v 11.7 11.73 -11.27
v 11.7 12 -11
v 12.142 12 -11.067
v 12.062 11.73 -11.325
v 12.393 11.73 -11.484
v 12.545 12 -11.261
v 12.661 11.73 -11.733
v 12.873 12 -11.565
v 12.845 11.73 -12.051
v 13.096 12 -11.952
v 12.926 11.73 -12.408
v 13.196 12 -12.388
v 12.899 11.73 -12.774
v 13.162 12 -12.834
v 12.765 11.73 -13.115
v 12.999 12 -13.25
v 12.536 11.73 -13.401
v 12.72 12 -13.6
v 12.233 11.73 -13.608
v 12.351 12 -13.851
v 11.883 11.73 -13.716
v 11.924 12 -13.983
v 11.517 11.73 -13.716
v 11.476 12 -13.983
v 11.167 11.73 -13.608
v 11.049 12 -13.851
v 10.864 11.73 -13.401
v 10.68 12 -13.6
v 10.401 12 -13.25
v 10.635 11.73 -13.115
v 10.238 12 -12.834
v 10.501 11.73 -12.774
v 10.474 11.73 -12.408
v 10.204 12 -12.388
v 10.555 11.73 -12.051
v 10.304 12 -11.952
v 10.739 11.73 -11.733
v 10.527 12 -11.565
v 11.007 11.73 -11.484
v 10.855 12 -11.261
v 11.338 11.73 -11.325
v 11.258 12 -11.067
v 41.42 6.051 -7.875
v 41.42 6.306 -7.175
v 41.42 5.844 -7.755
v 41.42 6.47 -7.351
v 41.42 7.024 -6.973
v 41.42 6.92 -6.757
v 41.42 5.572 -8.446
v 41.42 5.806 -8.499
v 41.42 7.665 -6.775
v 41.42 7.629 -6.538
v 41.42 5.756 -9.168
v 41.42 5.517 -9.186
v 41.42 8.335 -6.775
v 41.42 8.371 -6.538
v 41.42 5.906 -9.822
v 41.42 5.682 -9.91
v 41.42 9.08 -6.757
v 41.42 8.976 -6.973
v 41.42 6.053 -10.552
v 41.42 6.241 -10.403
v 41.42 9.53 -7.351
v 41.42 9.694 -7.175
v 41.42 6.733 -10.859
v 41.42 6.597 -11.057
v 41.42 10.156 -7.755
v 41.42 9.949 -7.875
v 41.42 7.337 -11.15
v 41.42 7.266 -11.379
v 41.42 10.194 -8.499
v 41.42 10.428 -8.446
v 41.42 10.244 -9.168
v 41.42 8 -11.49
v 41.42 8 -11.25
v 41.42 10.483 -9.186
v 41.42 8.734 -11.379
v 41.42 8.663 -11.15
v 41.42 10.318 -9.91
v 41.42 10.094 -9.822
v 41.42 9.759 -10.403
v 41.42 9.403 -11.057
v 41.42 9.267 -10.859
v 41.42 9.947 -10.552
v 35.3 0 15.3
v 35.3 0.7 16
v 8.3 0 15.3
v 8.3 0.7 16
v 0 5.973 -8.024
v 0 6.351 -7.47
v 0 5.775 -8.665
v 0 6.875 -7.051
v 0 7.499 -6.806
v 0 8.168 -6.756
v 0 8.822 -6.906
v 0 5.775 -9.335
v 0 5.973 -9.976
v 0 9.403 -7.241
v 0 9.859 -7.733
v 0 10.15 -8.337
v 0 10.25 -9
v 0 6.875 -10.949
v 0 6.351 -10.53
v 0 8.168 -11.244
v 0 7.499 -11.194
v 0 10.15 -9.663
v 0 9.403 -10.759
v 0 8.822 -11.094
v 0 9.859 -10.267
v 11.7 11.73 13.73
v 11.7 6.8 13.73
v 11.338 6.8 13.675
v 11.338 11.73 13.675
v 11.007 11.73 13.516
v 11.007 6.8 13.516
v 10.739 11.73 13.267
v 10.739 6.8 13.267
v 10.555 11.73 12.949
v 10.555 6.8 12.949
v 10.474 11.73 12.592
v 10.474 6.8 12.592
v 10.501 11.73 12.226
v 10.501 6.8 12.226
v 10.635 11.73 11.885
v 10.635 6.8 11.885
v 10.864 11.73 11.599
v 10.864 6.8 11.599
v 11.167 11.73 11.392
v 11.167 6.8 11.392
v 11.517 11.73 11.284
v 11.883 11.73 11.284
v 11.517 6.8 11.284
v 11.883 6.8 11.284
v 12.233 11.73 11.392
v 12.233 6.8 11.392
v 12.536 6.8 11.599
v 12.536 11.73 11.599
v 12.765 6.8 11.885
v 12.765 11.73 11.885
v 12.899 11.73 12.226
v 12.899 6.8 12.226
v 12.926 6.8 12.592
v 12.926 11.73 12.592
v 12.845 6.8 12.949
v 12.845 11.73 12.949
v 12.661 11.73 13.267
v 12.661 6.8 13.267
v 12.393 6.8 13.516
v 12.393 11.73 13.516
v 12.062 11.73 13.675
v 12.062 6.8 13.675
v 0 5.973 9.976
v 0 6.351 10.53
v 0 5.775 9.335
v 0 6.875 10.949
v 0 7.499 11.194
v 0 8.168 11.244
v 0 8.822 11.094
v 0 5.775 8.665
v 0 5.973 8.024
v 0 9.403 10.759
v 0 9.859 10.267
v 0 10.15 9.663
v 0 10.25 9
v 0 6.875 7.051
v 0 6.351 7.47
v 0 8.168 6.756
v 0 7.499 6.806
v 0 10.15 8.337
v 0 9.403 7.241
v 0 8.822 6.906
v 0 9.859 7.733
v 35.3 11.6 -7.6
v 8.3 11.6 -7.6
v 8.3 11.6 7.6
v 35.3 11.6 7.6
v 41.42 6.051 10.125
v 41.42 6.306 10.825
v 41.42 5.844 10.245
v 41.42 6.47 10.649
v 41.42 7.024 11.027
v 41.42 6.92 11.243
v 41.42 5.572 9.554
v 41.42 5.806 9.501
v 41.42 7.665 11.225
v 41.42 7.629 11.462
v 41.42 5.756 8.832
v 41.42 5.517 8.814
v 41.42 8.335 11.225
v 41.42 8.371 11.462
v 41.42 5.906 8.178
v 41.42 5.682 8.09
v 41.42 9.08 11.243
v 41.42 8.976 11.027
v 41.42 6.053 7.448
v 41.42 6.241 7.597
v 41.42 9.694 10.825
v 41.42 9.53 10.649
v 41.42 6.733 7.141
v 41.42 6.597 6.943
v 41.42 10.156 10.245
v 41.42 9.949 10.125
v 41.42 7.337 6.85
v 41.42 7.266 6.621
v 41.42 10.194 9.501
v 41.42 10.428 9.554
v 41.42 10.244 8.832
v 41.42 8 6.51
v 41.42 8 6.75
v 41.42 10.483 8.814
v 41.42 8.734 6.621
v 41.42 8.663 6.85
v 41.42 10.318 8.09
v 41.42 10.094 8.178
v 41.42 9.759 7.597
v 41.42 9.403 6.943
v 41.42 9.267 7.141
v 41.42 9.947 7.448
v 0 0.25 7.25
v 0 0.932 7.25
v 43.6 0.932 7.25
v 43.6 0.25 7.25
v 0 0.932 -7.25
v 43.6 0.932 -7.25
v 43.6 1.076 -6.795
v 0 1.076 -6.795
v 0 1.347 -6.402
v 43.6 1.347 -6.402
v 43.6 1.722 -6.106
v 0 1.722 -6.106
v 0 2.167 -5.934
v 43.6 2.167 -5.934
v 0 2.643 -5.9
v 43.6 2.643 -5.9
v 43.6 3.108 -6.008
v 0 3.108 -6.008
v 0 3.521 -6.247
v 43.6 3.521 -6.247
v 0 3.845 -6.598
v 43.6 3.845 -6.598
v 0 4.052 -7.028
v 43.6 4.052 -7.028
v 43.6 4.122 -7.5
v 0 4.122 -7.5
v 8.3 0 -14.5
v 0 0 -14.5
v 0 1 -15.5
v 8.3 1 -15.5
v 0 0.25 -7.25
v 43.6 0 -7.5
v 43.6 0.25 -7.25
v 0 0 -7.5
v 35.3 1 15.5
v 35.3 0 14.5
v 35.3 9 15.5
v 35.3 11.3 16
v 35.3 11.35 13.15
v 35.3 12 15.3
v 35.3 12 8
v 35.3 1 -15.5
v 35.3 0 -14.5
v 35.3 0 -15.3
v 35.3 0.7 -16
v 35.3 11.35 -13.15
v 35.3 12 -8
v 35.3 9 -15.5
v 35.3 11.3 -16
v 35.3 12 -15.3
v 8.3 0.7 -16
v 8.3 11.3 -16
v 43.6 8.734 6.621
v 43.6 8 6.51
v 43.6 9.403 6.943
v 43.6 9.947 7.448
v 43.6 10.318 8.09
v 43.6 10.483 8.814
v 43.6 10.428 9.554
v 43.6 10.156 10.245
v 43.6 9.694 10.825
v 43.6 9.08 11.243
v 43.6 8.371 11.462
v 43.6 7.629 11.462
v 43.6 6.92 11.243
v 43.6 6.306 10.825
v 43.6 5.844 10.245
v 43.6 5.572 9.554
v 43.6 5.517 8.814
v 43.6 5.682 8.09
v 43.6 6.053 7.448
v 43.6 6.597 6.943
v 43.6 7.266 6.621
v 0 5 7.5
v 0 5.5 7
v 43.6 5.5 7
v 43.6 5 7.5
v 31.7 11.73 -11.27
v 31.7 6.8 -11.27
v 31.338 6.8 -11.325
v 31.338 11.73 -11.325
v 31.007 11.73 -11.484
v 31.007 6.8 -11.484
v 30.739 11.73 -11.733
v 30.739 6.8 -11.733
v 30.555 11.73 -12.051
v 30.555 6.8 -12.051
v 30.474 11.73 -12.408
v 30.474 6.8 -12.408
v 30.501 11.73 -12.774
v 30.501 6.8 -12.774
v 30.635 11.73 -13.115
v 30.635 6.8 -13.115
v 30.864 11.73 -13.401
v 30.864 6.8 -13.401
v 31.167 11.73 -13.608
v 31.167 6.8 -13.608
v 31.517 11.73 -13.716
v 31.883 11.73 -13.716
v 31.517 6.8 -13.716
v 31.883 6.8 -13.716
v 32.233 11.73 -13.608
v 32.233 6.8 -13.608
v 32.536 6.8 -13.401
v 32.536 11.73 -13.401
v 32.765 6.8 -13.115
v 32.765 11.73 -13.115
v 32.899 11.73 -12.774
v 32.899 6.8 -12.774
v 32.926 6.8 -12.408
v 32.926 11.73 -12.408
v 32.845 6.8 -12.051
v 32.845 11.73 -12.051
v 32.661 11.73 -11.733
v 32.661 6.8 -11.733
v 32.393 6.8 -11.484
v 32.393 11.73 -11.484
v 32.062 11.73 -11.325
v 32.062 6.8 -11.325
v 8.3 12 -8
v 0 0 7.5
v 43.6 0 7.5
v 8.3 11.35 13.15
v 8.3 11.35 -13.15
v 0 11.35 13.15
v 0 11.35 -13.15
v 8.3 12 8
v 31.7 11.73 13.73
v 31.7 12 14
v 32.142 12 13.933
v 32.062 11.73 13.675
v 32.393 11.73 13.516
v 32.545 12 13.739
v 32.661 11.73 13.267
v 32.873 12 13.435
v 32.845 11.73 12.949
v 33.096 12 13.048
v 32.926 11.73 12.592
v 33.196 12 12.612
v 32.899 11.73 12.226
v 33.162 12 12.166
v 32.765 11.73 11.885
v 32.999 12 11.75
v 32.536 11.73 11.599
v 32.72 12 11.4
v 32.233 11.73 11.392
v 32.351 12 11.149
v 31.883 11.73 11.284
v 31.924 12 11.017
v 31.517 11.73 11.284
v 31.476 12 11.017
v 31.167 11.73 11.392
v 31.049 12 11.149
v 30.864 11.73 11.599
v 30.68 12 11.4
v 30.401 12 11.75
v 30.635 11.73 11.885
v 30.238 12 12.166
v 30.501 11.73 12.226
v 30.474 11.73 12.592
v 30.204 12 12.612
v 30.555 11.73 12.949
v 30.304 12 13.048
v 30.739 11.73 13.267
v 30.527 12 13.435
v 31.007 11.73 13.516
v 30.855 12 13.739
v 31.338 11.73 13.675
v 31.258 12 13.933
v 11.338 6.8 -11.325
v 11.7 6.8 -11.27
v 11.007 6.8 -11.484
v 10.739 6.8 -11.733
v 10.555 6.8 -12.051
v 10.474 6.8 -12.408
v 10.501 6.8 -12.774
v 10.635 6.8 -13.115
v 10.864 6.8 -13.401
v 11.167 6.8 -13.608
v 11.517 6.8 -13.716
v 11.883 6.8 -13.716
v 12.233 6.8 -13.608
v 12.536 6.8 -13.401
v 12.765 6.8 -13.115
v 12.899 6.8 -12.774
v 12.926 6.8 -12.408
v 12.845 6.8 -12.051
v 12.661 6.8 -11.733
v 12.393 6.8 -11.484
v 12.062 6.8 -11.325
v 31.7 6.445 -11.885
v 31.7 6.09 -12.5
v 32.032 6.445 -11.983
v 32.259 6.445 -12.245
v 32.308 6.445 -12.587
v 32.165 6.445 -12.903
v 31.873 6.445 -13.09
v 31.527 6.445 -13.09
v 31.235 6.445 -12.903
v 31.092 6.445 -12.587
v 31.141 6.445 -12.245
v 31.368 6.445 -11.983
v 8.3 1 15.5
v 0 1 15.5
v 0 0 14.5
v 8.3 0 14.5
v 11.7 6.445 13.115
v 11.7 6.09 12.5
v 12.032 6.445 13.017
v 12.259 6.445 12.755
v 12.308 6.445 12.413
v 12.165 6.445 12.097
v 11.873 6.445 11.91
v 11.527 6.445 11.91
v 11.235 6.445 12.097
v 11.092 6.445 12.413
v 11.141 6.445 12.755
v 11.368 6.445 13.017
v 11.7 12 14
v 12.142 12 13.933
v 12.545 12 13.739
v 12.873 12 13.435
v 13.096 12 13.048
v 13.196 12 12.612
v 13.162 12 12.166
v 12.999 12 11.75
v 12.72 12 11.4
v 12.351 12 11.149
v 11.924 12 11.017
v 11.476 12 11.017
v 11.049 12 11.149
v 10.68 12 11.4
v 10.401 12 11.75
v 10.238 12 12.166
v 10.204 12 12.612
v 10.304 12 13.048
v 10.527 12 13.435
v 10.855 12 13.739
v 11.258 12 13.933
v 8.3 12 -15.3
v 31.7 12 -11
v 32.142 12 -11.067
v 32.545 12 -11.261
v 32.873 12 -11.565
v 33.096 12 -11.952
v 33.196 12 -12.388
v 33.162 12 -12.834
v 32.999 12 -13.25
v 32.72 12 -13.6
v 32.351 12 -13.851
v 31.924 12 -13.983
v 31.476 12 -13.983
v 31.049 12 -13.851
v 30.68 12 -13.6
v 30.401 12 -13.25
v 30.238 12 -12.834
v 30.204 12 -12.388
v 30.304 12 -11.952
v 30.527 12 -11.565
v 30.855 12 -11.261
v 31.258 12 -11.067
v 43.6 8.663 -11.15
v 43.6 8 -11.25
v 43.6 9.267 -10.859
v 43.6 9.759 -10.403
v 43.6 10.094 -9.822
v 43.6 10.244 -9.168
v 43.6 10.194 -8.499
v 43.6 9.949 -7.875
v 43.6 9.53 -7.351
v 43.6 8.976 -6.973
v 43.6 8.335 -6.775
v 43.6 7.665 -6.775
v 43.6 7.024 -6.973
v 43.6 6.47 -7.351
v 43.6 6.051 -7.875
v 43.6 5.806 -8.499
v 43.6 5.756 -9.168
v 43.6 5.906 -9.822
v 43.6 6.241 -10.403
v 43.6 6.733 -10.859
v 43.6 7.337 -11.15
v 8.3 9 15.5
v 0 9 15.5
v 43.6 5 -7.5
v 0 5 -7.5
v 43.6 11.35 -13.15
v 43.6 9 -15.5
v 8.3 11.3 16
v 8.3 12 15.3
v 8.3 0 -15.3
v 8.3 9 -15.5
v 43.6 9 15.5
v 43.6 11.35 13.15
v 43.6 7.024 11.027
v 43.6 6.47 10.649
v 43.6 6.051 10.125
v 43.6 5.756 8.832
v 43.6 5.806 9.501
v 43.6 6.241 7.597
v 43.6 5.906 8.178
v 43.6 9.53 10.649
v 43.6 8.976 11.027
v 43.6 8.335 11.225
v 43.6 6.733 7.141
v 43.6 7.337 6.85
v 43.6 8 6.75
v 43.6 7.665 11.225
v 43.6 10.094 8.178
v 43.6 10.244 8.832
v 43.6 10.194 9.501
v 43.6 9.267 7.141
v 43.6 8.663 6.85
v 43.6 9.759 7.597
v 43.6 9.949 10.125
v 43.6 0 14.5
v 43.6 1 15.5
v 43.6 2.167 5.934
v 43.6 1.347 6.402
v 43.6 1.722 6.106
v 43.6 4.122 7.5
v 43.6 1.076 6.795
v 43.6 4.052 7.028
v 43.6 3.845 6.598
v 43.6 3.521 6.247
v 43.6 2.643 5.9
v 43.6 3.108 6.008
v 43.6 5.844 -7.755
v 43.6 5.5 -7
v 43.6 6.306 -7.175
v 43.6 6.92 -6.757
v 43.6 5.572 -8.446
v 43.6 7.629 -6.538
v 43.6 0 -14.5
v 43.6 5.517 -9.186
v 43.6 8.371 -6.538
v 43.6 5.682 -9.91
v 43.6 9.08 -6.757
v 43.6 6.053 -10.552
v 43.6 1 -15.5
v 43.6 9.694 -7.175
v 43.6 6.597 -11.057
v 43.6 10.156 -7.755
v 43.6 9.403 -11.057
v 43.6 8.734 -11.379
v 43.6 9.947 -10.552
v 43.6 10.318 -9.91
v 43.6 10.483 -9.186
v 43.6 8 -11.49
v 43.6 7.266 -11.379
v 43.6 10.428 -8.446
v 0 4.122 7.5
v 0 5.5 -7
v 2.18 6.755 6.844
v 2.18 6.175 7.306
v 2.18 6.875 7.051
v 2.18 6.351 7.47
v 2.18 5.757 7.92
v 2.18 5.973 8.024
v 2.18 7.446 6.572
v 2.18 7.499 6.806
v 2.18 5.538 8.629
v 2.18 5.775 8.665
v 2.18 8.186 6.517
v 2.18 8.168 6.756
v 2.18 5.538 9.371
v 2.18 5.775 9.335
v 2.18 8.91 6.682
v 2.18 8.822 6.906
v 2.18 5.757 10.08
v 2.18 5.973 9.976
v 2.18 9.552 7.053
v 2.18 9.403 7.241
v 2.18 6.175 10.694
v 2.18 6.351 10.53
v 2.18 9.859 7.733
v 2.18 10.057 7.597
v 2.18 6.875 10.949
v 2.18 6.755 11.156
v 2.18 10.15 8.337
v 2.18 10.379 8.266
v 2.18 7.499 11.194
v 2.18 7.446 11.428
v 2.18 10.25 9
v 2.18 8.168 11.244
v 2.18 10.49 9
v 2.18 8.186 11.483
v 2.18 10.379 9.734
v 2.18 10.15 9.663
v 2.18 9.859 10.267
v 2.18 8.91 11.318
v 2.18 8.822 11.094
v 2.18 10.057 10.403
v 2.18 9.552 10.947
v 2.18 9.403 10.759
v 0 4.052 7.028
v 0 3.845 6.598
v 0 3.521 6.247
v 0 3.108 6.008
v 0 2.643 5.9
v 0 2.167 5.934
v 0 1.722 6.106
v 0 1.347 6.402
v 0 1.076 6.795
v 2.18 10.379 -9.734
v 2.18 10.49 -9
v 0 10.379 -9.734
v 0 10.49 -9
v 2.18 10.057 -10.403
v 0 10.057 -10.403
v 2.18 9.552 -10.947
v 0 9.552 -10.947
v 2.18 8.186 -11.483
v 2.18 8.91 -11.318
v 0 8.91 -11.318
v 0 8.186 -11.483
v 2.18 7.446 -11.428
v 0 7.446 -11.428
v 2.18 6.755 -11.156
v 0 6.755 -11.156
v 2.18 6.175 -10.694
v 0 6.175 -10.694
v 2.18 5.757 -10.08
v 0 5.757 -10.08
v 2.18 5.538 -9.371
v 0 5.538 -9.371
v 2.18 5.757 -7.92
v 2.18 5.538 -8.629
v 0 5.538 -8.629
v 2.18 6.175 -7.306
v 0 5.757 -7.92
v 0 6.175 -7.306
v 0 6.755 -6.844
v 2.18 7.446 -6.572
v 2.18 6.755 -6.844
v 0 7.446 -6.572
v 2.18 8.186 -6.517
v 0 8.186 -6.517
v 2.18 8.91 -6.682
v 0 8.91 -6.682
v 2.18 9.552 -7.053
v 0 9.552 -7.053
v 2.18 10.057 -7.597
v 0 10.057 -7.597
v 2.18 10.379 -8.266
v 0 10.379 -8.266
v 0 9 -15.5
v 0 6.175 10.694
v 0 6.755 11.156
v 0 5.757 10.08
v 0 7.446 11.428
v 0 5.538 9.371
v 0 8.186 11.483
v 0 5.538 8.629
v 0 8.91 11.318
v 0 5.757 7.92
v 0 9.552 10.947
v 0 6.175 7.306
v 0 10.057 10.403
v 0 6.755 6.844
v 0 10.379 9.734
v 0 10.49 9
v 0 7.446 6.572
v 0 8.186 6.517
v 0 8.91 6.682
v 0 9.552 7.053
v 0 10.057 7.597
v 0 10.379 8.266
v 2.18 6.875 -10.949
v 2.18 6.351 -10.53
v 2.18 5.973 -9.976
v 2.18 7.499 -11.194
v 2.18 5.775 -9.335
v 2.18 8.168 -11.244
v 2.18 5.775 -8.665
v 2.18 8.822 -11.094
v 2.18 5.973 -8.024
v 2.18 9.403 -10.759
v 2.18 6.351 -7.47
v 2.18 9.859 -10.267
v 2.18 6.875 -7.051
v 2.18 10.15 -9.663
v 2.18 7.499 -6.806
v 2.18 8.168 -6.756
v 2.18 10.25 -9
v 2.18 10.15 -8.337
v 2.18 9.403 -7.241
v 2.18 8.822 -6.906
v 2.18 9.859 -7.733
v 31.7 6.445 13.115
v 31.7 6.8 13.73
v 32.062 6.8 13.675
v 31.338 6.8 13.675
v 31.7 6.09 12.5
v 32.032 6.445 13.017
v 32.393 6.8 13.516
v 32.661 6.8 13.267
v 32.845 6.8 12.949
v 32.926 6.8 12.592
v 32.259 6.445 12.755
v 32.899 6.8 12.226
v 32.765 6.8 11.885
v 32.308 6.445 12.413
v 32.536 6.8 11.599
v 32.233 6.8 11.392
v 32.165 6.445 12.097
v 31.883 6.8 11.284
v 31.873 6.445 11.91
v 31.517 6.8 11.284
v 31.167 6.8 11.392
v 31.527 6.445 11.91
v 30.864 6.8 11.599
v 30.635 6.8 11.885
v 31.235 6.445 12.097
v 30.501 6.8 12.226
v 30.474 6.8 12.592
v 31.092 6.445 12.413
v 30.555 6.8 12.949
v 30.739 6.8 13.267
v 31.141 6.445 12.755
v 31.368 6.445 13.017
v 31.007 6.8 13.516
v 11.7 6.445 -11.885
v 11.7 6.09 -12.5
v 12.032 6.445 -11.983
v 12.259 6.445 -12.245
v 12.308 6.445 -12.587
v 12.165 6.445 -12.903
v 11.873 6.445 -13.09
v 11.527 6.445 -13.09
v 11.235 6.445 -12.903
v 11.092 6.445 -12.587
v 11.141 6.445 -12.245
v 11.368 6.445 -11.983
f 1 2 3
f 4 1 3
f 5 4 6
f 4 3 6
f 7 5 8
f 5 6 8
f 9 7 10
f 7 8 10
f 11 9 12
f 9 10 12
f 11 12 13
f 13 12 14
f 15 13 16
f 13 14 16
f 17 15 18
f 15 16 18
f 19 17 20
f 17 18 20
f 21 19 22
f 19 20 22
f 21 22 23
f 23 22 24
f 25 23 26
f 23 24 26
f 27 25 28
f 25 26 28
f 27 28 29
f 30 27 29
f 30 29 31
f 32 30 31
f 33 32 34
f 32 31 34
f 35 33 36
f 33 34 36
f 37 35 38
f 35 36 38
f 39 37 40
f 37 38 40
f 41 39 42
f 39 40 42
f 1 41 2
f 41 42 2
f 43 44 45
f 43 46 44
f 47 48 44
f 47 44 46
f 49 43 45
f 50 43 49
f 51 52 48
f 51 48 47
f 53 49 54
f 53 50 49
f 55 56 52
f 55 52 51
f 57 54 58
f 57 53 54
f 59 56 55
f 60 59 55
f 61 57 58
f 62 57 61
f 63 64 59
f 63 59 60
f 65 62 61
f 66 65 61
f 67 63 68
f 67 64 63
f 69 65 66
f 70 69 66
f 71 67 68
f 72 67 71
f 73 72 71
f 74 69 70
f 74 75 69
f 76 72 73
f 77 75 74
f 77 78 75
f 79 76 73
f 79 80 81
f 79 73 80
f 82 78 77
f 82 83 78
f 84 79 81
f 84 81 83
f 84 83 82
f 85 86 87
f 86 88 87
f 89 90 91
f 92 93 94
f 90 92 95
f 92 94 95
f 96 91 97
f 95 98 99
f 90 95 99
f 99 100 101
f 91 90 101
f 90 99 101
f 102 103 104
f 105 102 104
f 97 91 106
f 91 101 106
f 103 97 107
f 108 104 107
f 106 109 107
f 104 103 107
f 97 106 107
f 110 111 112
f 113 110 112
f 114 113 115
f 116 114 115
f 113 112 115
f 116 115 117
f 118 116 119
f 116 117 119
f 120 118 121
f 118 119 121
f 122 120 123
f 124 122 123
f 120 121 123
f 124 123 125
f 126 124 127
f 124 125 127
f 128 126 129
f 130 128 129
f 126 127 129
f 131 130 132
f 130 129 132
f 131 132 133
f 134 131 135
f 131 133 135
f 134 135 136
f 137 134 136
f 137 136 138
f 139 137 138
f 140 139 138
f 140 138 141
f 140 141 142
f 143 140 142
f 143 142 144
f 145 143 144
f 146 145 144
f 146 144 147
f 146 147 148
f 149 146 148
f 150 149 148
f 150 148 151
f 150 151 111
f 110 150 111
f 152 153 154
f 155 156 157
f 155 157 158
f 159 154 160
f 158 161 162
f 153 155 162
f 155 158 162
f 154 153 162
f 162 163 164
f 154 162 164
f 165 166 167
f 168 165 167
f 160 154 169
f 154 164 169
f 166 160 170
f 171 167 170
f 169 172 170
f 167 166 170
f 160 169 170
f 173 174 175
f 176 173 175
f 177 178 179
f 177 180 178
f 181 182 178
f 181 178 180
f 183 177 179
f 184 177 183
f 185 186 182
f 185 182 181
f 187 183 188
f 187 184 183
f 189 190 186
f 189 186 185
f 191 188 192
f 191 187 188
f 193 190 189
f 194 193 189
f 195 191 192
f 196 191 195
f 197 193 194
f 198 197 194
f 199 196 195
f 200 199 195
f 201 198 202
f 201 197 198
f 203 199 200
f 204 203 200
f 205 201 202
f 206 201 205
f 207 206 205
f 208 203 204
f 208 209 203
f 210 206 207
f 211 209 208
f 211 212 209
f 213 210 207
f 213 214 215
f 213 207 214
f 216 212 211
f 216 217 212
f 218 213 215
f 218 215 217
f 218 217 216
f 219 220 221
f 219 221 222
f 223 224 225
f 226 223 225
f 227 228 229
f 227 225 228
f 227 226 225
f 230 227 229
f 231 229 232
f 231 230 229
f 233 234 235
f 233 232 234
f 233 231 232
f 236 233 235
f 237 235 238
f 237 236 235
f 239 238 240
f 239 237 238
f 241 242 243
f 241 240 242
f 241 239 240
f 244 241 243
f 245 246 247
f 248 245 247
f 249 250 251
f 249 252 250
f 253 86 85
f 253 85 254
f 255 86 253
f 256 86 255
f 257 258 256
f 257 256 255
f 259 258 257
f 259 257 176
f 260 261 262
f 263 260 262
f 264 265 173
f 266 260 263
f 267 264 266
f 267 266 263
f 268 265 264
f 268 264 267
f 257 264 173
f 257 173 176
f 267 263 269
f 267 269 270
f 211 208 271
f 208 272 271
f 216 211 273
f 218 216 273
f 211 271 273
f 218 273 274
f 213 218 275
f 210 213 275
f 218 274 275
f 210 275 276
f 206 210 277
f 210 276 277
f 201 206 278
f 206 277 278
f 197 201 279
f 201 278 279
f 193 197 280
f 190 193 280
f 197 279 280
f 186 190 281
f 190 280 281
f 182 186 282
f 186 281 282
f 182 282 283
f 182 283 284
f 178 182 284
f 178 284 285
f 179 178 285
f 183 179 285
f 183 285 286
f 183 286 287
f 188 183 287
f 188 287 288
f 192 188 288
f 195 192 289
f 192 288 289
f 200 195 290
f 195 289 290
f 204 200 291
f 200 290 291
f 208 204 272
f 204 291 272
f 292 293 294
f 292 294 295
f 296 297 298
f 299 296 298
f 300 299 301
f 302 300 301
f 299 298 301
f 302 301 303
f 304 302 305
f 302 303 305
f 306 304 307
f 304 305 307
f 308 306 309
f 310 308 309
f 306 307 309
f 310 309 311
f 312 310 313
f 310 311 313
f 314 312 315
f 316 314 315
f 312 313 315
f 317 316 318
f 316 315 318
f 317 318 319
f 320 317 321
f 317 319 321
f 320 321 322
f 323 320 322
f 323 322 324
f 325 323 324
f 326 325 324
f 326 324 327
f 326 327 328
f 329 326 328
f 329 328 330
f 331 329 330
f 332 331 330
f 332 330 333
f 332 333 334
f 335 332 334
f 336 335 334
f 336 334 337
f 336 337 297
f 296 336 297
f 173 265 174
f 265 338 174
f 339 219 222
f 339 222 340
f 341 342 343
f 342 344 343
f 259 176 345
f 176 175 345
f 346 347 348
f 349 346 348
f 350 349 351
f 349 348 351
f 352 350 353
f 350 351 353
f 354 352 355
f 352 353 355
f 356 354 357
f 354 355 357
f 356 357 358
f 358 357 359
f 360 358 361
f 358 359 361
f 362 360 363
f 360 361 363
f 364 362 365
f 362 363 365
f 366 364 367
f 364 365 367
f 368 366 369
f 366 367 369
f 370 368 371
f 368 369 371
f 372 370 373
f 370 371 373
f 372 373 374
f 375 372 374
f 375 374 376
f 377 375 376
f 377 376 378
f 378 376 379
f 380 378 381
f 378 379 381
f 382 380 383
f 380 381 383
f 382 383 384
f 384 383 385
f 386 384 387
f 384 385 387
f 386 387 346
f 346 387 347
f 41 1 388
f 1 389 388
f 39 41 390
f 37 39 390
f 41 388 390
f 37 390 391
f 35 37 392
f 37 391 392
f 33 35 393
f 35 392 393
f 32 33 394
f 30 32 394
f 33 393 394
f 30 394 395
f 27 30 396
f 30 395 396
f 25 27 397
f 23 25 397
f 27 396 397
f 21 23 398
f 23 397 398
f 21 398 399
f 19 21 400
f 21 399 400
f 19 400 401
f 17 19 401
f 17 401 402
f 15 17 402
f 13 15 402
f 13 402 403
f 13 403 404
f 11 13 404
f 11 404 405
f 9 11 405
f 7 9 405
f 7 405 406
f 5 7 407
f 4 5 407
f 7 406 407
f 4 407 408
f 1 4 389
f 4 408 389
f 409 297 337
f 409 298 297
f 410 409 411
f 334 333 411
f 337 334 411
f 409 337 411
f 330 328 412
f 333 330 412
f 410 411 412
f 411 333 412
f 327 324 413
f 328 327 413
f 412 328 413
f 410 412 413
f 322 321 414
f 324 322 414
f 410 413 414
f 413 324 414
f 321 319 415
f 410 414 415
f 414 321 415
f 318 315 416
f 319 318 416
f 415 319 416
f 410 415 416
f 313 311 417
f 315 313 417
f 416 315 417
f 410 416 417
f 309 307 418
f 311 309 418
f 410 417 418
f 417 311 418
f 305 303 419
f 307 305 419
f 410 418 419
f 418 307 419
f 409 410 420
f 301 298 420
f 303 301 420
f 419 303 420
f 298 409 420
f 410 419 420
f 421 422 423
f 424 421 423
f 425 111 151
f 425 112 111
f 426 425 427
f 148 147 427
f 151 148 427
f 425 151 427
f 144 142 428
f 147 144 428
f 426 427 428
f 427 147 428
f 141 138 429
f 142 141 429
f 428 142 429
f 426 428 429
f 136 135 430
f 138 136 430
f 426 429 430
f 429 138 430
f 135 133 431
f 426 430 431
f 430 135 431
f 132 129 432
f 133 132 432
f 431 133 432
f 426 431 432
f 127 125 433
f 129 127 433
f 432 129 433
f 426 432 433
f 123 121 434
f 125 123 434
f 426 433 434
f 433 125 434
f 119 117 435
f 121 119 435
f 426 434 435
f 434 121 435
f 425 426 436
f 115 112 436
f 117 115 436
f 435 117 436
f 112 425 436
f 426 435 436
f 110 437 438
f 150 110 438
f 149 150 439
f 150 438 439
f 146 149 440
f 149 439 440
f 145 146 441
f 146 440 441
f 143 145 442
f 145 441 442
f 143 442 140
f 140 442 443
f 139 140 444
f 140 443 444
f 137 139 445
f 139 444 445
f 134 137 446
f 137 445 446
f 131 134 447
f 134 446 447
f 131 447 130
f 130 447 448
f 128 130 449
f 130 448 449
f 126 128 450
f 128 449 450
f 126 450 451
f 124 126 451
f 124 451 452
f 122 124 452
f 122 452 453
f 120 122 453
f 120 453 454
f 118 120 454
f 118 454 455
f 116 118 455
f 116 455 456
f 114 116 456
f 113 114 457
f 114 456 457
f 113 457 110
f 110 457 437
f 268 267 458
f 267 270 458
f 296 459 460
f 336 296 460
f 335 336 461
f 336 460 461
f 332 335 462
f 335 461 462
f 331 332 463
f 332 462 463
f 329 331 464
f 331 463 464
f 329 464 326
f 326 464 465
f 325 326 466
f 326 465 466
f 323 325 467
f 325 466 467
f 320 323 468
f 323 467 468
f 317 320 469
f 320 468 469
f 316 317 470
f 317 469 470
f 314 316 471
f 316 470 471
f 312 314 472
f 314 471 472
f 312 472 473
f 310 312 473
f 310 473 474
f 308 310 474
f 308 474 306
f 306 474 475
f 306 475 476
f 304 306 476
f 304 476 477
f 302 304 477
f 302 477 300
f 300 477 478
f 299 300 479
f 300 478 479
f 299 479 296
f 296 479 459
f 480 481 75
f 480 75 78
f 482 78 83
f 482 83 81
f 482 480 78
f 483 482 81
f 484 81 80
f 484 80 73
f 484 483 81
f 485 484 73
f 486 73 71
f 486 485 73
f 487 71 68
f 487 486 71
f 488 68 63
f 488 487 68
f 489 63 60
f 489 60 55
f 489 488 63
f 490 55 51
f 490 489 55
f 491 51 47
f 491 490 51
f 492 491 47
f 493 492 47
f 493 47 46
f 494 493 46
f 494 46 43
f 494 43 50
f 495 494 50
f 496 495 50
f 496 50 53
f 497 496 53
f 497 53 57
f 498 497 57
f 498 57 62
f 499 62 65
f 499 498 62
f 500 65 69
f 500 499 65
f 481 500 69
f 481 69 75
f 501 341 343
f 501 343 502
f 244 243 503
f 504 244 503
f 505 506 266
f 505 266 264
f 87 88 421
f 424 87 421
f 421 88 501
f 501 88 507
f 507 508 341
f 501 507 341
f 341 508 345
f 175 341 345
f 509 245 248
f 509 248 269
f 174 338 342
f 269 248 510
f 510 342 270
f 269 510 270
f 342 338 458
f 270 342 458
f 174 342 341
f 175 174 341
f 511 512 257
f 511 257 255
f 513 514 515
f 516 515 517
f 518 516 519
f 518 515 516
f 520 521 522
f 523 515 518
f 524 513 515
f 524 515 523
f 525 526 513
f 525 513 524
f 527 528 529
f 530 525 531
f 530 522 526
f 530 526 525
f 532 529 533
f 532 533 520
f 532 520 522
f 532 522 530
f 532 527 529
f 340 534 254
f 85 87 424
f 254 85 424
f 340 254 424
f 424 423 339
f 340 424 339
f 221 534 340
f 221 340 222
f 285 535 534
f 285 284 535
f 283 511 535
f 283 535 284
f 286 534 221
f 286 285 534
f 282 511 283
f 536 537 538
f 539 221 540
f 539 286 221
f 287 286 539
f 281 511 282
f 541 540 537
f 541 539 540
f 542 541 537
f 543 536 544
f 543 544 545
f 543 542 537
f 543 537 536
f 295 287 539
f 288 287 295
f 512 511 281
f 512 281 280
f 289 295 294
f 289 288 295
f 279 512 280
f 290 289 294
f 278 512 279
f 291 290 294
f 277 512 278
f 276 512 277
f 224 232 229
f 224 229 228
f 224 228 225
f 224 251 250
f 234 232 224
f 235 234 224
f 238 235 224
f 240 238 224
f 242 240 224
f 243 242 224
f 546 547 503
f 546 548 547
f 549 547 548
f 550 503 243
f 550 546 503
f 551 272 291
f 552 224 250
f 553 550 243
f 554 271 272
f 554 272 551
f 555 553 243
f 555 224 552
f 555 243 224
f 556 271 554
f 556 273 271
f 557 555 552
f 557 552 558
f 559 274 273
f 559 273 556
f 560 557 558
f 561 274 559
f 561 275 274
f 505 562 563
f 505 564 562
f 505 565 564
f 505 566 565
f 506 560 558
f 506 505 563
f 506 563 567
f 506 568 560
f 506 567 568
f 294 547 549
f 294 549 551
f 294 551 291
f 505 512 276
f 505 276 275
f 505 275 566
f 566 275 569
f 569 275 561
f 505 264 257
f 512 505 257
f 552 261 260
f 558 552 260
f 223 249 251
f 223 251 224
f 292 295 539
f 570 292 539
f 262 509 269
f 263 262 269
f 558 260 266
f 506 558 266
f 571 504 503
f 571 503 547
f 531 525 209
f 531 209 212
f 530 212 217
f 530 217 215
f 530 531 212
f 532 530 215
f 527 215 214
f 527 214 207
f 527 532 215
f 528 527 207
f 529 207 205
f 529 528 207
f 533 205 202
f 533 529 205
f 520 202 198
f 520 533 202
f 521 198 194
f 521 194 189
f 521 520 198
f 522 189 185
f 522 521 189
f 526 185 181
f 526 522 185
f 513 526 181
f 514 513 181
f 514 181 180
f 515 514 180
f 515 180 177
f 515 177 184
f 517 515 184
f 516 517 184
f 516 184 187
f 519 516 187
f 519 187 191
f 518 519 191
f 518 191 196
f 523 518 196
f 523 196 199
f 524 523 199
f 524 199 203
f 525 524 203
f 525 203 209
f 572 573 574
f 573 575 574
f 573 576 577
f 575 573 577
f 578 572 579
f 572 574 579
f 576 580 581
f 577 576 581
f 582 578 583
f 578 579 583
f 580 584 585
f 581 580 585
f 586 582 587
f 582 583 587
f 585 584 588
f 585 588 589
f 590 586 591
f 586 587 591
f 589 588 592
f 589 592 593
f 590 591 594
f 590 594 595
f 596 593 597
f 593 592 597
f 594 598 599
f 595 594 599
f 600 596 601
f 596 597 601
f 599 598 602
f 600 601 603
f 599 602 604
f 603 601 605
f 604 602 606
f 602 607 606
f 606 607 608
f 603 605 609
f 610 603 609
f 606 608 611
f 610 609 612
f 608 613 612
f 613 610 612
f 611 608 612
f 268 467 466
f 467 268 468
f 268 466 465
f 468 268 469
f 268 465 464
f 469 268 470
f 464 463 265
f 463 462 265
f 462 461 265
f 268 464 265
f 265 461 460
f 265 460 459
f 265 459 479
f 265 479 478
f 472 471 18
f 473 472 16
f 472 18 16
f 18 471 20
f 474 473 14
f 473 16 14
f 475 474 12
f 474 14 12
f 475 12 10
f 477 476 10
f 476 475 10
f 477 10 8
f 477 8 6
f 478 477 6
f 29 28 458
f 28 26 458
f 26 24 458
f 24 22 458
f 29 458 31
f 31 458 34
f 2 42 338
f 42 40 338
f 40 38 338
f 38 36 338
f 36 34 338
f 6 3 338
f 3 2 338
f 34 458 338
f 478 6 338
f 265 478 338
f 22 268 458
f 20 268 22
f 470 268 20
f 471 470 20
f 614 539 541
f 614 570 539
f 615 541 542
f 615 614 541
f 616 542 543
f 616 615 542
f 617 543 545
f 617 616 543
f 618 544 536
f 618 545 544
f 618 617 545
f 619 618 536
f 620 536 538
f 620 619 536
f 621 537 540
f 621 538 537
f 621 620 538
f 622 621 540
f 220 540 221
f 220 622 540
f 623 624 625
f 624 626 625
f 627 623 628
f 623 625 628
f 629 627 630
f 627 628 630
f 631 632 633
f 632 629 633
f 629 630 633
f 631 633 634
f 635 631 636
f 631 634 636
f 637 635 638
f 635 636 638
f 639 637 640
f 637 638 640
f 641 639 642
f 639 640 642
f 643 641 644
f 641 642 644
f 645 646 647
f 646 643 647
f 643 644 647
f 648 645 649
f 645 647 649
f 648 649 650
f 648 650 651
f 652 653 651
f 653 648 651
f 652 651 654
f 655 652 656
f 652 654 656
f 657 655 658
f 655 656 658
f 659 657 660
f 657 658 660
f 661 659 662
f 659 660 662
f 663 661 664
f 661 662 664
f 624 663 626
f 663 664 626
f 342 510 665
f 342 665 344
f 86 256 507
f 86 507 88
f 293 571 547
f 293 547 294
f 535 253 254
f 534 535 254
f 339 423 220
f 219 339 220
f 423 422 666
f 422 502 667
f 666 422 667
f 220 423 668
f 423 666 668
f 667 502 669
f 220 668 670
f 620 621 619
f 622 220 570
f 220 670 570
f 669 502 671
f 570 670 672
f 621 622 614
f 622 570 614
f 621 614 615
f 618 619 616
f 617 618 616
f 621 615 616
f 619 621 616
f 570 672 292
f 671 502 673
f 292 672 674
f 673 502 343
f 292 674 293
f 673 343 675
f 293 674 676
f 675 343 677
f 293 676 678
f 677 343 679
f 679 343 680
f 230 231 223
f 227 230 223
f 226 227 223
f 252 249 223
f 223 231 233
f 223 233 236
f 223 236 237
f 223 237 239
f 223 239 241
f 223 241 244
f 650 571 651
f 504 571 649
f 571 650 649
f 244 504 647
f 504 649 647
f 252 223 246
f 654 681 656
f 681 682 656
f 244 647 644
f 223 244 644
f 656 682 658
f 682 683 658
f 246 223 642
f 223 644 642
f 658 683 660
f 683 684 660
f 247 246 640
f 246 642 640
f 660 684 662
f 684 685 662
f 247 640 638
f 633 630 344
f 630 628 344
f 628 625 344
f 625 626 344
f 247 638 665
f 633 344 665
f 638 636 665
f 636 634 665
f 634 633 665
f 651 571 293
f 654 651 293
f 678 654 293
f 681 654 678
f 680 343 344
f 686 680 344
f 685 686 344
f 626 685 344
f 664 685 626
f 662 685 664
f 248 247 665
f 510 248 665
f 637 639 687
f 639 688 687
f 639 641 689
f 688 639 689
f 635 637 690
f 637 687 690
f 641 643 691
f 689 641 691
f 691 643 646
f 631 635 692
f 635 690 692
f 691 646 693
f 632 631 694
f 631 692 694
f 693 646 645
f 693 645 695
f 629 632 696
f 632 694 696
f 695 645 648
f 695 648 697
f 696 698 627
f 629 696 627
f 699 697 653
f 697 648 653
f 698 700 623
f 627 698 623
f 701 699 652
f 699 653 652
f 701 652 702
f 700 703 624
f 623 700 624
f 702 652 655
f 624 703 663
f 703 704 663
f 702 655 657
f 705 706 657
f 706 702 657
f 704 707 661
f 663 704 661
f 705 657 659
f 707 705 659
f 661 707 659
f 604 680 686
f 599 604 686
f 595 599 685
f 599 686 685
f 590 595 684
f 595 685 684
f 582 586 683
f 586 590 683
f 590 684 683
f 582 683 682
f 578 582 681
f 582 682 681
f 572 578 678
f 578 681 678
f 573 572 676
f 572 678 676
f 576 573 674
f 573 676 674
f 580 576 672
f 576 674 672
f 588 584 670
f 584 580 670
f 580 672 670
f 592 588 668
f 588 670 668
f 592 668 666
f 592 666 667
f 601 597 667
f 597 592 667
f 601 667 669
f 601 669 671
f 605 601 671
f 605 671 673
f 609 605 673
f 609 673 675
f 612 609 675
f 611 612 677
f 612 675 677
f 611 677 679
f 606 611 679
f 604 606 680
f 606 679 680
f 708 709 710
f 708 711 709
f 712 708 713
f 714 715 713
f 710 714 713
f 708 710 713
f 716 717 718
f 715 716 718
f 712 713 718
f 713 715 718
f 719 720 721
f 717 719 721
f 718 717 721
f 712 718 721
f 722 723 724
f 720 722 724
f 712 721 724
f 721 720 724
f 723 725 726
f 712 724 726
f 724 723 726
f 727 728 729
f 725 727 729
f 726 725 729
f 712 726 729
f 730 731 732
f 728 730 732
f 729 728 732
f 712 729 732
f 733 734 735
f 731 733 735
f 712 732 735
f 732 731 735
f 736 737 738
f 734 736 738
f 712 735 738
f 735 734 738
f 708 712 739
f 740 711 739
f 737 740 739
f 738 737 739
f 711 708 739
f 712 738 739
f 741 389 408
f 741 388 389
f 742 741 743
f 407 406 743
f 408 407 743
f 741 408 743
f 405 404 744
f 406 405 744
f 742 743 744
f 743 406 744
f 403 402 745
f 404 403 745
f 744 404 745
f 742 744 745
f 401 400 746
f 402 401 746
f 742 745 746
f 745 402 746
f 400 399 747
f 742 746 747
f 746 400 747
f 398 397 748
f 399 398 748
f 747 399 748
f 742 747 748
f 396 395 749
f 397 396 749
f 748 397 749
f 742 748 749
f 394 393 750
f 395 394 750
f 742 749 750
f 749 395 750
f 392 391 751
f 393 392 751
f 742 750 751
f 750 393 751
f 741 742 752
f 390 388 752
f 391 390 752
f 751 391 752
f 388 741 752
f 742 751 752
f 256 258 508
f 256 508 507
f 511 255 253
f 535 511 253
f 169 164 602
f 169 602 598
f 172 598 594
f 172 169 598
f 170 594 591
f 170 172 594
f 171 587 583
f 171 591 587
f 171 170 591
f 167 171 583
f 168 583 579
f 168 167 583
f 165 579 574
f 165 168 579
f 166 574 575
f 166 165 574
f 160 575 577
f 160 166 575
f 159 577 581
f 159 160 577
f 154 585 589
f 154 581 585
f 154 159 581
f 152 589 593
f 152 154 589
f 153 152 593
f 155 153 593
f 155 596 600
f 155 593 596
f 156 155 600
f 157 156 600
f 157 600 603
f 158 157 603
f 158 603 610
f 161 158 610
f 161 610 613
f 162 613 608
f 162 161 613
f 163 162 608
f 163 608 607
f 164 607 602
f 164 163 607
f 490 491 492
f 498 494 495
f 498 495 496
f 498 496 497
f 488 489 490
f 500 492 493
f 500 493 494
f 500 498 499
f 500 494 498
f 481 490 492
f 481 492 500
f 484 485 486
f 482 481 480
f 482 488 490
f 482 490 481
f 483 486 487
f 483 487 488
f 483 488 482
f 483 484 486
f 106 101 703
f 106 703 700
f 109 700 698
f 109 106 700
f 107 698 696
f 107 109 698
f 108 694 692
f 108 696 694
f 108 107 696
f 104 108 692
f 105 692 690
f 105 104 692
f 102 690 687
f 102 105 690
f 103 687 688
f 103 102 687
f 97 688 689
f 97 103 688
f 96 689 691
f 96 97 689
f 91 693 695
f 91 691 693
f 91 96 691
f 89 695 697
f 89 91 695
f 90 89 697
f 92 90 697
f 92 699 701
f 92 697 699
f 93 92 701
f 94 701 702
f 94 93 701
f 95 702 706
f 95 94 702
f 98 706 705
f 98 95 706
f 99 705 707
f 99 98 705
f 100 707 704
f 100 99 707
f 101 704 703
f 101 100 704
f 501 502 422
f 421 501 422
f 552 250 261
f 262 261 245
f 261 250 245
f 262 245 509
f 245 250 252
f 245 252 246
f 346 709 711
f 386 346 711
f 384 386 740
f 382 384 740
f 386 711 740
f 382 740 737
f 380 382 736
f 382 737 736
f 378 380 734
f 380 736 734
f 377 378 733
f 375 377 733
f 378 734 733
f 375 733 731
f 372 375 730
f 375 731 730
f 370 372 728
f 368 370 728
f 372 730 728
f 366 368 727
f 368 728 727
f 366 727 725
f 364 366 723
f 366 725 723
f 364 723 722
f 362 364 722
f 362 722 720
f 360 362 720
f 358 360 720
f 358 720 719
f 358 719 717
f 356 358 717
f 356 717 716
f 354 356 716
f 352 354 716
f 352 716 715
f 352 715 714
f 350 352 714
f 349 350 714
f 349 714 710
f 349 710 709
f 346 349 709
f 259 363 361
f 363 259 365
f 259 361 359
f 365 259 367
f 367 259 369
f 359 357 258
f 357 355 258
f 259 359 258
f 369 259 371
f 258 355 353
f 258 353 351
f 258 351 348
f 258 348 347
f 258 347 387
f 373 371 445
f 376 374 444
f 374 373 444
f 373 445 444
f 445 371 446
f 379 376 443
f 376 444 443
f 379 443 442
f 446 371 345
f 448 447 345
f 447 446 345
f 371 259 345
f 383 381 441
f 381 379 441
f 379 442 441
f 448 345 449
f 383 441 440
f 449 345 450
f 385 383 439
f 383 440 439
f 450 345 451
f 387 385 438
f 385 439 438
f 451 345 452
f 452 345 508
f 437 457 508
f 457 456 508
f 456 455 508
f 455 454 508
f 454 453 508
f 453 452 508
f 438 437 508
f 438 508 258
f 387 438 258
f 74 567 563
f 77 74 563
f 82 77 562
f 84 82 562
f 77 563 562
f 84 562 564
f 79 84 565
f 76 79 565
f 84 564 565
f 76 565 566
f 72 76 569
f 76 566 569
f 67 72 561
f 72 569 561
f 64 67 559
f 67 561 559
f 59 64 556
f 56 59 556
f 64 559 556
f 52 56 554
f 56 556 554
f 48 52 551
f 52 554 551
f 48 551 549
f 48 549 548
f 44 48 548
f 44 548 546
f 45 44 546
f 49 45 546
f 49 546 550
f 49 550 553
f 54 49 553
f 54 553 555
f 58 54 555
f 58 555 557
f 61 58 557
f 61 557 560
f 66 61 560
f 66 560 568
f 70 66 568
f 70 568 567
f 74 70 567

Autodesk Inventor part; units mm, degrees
sketch "Sketch_31" plane through (0, 0, 0) normal (1, 0, 0) x (0, 0, -1)
  line L0 (-15.5, 9) -> (-15.5, 1)
  line L1 (-15.5, 1) -> (-14.5, 0)
  line L2 (-14.5, 0) -> (14.4999, 0)
  line L3 (14.4999, 0) -> (15.5, 1)
  line L4 (15.5, 1) -> (15.5, 9)
  line L5 (15.5, 9) -> (13.15, 11.35)
  line L6 (13.15, 11.35) -> (-13.15, 11.35)
  line L7 (-13.15, 11.35) -> (-15.5, 9)
extrude "Extrusion1" add sketch "Sketch_31" along normal blind 43.6
sketch "Sketch_32" plane through (8.3, 0, 0) normal (1, 0, 0) x (0, 0, -1)
  line L0 (-16, 0.7) -> (-15.3, 0)
  line L1 (-15.3, 0) -> (15.3, 0)
  line L2 (15.3, 0) -> (16, 0.7)
  line L3 (16, 0.7) -> (16, 11.3)
  line L4 (16, 11.3) -> (15.3, 12)
  line L5 (15.3, 12) -> (8, 12)
  line L6 (8, 12) -> (7.6, 11.6)
  line L7 (7.6, 11.6) -> (-7.6, 11.6)
  line L8 (-7.6, 11.6) -> (-7.9999, 12)
  line L9 (-7.9999, 12) -> (-15.2999, 12)
  line L10 (-15.2999, 12) -> (-16, 11.3)
  line L11 (-16, 11.3) -> (-16, 0.7)
extrude "Extrusion2" add sketch "Sketch_32" along normal blind 27
sketch "Sketch_33" plane through (0, 0, 0) normal (1, 0, 0) x (0, 0, -1)
  line L0 (-7.5, 5) -> (-7.5, 4.1225)
  arc A0 (-7.25, 0.9321) -> (-7.5, 4.1225) centre (-7.5, 2.5175) ccw
  line L1 (-7.25, 0.9321) -> (-7.25, 0.25)
  line L2 (-7.25, 0.25) -> (-7.5, 0)
  line L3 (-7.5, 0) -> (-7.5, -3.5)
  line L4 (-7.5, -3.5) -> (-7, -4)
  line L5 (-7, -4) -> (6.9999, -4)
  line L6 (6.9999, -4) -> (7.5, -3.5)
  line L7 (7.5, -3.5) -> (7.5, 0)
  line L8 (7.5, 0) -> (7.25, 0.25)
  line L9 (7.25, 0.25) -> (7.25, 0.9321)
  arc A1 (7.5, 4.1225) -> (7.25, 0.9321) centre (7.5, 2.5175) ccw
  line L10 (7.5, 4.1225) -> (7.5, 5)
  line L11 (7.5, 5) -> (7, 5.5)
  line L12 (7, 5.5) -> (-7, 5.5)
  line L13 (-7, 5.5) -> (-7.5, 5)
extrude "Extrusion3" cut sketch "Sketch_33" along normal blind 43.6
sketch "Sketch4" plane through (8.3, 12, 15.2999) normal (0, 1, 0) x (1, 0, 0)
  point P0 (3.4, 2.7999)
hole "Hole1" at (11.7, 12, 12.5) direction (0, -1, 0) diameter 2.459 depth 5.2 tip angle 120 countersink diameter 3 countersink angle 90 thread size "M3x0.5" class "6H" standard "ISO Metric profile"
pattern_linear "Rectangular Pattern1" count 2 spacing 20 along (1, 0, 0) count 2 spacing 25 along (0, 0, -1) of "Hole1"
sketch "Sketch_56" plane through (0, 0, 0) normal (1, 0, 0) x (0, 1, 0)
  circle A0 centre (8, 9) radius 2.49
  circle A1 centre (8, 9) radius 2.25
extrude "Extrusion4" cut sketch "Sketch_56" along normal blind 2.18
sketch "Sketch_61" plane through (0, 0, 0) normal (1, 0, 0) x (0, 1, 0)
  circle A0 centre (8, -9) radius 2.49
  circle A1 centre (8, -9) radius 2.25
extrude "Extrusion5" cut sketch "Sketch_61" along normal blind 2.18
sketch "Sketch_60" plane through (43.6, 0, 0) normal (1, 0, 0) x (0, 0, -1)
  circle A0 centre (-9, 8) radius 2.49
  circle A1 centre (-9, 8) radius 2.25
extrude "Extrusion6" cut sketch "Sketch_60" against normal blind 2.18
sketch "Sketch_63" plane through (43.6, 0, 0) normal (1, 0, 0) x (0, 0, -1)
  circle A0 centre (9, 8) radius 2.49
  circle A1 centre (9, 8) radius 2.25
extrude "Extrusion7" cut sketch "Sketch_63" against normal blind 2.18
ref_plane "slider_XY" through (0, 0, 0) normal (1, 0, 0) x (0, 0, -1)
ref_plane "slider_YZ" through (0, 0, 0) normal (0, 0, -1) x (0, 1, 0)
ref_plane "slider_ZX" through (0, 0, 0) normal (0, 1, 0) x (1, 0, 0)
properties part number "LU15ALW/O_slider_1"
